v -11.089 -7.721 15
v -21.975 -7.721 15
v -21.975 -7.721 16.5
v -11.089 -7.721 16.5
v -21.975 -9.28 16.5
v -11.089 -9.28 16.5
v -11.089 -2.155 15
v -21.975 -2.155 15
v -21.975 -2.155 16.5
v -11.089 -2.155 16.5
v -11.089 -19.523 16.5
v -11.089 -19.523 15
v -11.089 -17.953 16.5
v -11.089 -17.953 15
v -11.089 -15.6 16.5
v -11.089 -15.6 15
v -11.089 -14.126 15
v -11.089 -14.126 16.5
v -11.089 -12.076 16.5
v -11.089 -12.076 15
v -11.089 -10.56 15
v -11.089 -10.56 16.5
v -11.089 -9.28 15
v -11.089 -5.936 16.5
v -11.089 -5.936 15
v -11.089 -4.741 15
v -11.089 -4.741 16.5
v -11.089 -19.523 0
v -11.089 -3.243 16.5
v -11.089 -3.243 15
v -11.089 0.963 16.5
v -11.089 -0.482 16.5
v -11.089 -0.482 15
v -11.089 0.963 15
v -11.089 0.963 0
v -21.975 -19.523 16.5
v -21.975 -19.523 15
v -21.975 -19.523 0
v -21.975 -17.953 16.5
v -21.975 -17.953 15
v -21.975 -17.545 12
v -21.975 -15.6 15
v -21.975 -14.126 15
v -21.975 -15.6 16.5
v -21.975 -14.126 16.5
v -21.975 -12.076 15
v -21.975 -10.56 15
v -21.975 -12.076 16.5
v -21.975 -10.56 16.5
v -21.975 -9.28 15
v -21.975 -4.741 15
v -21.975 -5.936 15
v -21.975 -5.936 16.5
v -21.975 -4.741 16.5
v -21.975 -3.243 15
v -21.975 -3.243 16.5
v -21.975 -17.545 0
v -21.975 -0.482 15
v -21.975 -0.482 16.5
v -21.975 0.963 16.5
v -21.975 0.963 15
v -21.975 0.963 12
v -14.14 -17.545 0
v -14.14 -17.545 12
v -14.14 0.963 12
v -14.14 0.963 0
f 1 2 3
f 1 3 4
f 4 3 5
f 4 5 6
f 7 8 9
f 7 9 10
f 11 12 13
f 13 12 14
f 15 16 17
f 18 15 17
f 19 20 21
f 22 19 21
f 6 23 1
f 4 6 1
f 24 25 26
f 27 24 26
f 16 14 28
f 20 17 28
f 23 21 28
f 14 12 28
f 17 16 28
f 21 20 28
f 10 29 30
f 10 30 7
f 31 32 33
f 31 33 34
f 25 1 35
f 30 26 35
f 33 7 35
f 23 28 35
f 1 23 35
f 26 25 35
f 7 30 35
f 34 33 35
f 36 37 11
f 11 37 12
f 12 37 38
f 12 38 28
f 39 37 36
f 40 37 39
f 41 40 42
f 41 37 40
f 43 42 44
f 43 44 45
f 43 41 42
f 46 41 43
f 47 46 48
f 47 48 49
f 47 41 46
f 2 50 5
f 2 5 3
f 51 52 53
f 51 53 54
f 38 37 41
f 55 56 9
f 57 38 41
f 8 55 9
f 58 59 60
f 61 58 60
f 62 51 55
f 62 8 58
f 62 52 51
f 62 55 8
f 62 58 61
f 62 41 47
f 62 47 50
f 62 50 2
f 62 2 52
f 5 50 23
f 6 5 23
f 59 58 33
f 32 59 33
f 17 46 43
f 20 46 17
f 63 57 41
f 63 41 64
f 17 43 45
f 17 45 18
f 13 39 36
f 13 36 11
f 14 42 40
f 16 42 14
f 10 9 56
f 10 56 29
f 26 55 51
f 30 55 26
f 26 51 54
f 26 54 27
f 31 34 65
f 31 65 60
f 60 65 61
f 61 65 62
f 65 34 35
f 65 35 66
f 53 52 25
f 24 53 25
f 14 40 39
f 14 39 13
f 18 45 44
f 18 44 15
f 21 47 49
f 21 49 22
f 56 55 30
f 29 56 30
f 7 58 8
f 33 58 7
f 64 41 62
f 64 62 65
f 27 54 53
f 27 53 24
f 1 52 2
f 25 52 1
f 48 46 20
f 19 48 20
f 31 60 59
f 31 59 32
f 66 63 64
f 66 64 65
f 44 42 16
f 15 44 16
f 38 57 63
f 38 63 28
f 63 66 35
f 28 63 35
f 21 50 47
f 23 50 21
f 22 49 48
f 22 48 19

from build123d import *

# Parameters (mm, degrees)
F0_W     = 5.5
F0_H     = 16.3
F0_W_2   = 2.3349355608
F0_H_2   = 2.2036070004
F1_DEPTH = 15
F2_DEPTH = 12
F3_W     = 10.8860824257
F3_H     = 1.5700478107
F3_H_2   = 1.4735469595
F3_H_3   = 1.5152581036
F3_H_4   = 1.5589032643
F3_H_5   = 1.1953348294
F3_H_6   = 1.0883370414
F3_H_7   = 1.4443685184
F4_DEPTH = 1.5


with BuildPart() as f1:
    # F0 (on Top) → F1 (new body)
    with BuildSketch(Plane.XY):
        with Locations((-19.2246585935, -7.1874150395)):
            Rectangle(F0_W, F0_H)
        Polygon((-14.1397230327, 0.9625849605), (-16.4746585935, 0.9625849605), (-16.4746585935, -15.3374150395), (-16.4746585935, -15.3418527916), (-14.1397230327, -15.3418527916), align=None)
        Polygon((-16.4746585935, -15.3374150395), (-21.9746585935, -15.3374150395), (-21.9746585935, -17.545459792), (-16.4746585935, -17.545459792), (-16.4746585935, -15.3418527916), align=None)
        Polygon((-11.0885761678, 0.9625849605), (-14.1397230327, 0.9625849605), (-14.1397230327, -15.3418527916), (-14.1397230327, -17.545459792), (-11.0885761678, -17.545459792), align=None)
        Polygon((-16.4746585935, -17.545459792), (-21.9746585935, -17.545459792), (-21.9746585935, -19.5230543613), (-11.0885761678, -19.5230543613), (-11.0885761678, -17.545459792), (-14.1397230327, -17.545459792), align=None)
        with Locations((-15.3071908131, -16.4436562918)):
            Rectangle(F0_W_2, F0_H_2)
    extrude(amount=F1_DEPTH)

    # F0 (on Top) → F2 (cut)
    with BuildSketch(Plane.XY):
        Polygon((-14.1397230327, 0.9625849605), (-16.4746585935, 0.9625849605), (-16.4746585935, -15.3374150395), (-16.4746585935, -15.3418527916), (-14.1397230327, -15.3418527916), align=None)
        with Locations((-19.2246585935, -7.1874150395)):
            Rectangle(F0_W, F0_H)
        Polygon((-16.4746585935, -15.3374150395), (-21.9746585935, -15.3374150395), (-21.9746585935, -17.545459792), (-16.4746585935, -17.545459792), (-16.4746585935, -15.3418527916), align=None)
        with Locations((-15.3071908131, -16.4436562918)):
            Rectangle(F0_W_2, F0_H_2)
    extrude(amount=F2_DEPTH, mode=Mode.SUBTRACT)

    # F3 (on face) → F4 (join)
    with BuildSketch(Plane.XY.offset(15)):
        with Locations((-16.5316173807, -18.738030456)):
            Rectangle(F3_W, F3_H)
        with Locations((-16.5316173807, -14.8630174808)):
            Rectangle(F3_W, F3_H_2)
        with Locations((-16.5316173807, -11.318010278)):
            Rectangle(F3_W, F3_H_3)
        with Locations((-16.5316173807, -8.5007830683)):
            Rectangle(F3_W, F3_H_4)
        with Locations((-16.5316173807, -5.3385491483)):
            Rectangle(F3_W, F3_H_5)
        with Locations((-16.5316173807, -2.6988773607)):
            Rectangle(F3_W, F3_H_6)
        with Locations((-16.5316173807, 0.2404007013)):
            Rectangle(F3_W, F3_H_7)
    extrude(amount=F4_DEPTH)


solid = f1.part
